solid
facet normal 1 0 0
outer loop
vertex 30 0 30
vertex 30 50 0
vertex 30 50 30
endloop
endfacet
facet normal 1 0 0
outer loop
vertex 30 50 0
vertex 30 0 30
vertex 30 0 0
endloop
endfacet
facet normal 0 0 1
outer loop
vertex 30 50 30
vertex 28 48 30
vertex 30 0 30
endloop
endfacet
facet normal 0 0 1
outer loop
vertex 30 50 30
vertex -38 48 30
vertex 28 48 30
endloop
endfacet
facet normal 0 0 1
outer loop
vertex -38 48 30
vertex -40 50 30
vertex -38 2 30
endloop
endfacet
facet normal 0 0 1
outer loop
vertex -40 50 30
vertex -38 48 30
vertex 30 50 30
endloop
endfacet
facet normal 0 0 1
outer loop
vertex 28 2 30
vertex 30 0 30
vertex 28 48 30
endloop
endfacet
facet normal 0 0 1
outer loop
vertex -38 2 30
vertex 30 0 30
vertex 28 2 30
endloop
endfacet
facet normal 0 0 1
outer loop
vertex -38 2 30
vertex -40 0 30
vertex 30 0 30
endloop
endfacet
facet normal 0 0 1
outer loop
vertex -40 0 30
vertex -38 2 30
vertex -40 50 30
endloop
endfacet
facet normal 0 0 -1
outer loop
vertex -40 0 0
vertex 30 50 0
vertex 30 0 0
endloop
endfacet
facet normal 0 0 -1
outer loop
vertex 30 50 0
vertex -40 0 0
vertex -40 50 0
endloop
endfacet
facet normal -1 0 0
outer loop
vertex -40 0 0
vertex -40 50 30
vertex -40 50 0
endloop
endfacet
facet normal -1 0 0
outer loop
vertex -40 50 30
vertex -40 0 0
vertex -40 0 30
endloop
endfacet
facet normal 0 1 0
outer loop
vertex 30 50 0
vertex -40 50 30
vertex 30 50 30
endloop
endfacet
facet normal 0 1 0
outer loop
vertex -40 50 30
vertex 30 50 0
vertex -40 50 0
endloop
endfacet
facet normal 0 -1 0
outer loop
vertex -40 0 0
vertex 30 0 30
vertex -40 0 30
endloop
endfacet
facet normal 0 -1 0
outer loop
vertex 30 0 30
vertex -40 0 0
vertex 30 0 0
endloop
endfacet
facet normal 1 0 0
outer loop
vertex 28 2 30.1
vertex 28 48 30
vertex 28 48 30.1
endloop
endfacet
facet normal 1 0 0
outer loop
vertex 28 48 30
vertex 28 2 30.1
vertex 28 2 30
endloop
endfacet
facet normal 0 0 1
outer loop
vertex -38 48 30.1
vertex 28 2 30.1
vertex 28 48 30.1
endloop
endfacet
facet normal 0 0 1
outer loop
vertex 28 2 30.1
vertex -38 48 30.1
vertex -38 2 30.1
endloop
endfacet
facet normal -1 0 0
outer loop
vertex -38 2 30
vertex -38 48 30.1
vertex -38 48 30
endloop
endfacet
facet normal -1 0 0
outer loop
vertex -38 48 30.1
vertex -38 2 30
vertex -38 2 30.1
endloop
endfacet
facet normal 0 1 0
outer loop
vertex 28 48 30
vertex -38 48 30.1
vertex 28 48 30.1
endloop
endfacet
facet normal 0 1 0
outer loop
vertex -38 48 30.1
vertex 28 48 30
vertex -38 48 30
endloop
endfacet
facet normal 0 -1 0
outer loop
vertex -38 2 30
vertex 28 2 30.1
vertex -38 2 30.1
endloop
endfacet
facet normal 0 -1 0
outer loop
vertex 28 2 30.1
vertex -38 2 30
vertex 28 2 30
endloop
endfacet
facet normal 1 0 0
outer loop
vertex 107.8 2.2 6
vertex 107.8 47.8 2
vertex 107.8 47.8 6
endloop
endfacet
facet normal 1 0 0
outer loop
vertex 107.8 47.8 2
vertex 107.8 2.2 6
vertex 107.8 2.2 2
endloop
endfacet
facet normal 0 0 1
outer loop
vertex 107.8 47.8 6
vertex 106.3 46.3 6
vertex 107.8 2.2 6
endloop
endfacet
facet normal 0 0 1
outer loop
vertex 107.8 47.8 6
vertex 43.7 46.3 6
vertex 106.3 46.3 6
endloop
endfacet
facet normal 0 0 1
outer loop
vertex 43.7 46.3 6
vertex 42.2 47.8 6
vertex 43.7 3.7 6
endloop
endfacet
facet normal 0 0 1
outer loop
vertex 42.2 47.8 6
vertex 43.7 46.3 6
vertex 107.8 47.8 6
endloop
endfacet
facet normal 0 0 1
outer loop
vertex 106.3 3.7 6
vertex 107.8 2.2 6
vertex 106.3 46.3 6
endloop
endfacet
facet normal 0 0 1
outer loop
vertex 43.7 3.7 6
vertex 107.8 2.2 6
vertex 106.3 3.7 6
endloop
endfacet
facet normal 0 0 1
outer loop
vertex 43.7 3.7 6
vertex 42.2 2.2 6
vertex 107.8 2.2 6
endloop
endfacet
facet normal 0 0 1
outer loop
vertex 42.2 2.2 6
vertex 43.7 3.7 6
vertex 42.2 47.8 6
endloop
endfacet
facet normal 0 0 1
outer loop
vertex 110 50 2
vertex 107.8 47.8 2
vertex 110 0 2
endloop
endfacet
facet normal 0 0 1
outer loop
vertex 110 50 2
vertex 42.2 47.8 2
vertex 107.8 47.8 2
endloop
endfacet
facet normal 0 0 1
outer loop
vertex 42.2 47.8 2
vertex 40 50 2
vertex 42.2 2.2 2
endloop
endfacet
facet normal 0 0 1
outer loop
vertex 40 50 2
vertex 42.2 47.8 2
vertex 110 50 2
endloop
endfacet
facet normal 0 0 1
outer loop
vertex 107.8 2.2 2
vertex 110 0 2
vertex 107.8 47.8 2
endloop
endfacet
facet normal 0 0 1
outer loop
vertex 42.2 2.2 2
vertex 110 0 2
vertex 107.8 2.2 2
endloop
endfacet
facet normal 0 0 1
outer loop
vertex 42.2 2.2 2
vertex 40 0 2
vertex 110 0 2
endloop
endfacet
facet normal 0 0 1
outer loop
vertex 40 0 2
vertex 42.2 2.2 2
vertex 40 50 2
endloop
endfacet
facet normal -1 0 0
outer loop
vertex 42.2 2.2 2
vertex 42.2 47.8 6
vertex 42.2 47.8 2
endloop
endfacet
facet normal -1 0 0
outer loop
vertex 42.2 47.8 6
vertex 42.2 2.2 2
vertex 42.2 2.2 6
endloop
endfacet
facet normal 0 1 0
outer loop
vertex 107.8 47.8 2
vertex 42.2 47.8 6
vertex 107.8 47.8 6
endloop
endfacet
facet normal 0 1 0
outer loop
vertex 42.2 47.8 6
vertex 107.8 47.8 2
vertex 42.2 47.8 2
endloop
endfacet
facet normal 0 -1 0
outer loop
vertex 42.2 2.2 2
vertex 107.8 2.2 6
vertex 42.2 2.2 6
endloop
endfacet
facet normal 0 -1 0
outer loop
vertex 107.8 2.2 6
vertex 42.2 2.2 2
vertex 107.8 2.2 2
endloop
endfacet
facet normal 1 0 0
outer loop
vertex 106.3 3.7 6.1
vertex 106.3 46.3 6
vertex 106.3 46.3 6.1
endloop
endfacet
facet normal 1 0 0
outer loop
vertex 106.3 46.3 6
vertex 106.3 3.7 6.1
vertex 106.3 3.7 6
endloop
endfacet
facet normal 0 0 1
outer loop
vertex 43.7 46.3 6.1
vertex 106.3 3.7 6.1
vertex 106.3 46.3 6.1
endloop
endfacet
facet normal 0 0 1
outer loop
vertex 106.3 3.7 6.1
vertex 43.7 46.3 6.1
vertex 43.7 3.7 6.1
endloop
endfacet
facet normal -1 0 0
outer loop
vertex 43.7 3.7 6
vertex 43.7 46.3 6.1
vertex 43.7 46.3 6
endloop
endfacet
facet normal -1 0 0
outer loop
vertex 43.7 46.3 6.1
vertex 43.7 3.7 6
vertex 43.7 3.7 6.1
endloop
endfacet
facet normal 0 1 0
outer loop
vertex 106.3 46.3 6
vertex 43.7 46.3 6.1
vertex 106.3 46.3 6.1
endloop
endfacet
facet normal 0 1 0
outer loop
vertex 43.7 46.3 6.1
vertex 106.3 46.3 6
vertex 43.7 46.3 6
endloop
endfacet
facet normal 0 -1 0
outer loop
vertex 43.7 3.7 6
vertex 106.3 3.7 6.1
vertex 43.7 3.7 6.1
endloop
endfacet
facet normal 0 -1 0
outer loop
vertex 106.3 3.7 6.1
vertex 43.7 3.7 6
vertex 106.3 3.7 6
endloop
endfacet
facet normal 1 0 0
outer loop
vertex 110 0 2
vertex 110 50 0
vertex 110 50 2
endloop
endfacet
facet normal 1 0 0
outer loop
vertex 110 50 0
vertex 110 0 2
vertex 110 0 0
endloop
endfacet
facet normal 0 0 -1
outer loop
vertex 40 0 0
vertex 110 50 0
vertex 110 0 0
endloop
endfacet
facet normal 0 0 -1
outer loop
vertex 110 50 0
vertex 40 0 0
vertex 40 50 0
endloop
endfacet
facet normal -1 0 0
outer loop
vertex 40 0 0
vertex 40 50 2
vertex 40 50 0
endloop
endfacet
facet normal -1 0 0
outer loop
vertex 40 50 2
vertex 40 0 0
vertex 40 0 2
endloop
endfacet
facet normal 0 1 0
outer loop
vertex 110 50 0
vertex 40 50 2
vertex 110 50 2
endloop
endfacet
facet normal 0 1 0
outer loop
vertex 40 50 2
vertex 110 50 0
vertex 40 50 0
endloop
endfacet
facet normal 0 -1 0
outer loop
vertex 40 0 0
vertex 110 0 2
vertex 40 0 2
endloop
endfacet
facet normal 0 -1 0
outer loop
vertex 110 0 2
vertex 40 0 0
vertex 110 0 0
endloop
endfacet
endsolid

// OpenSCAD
// Dimensions for the box (Part 1)
box_outer_x = 70;
box_outer_y = 50;
box_outer_z = 30;
box_wall_thickness = 2;
box_floor_thickness = 2;

// Dimensions for the lid (Part 2)
lid_plate_x = 70;
lid_plate_y = 50;
lid_plate_z = 2;
lip_thickness = 1.5;
lip_height = 4;
lip_outer_x = 65.6;
lip_outer_y = 45.6;

// Layout parameters
gap = 10;
$fn = 64;

// --- Part 1: The Box ---
// Positioned on the left side (negative X)
// Center of the box is at x = -(box_outer_x/2 + gap/2)
box_center_x = -(box_outer_x/2 + gap/2);

translate([box_center_x, 0, 0]) {
    // Outer shell
    cube([box_outer_x, box_outer_y, box_outer_z], center = false);
    
    // Inner cavity
    // The cavity is defined by subtracting the wall thickness from the outer dimensions
    // X: box_outer_x - 2*wall_thickness
    // Y: box_outer_y - 2*wall_thickness
    // Z: box_outer_z - floor_thickness (open top)
    cavity_x = box_outer_x - 2 * box_wall_thickness;
    cavity_y = box_outer_y - 2 * box_wall_thickness;
    cavity_z = box_outer_z - box_floor_thickness;
    
    // Position the cavity so it aligns with the inner walls
    // X offset: wall_thickness
    // Y offset: wall_thickness
    // Z offset: floor_thickness
    translate([box_wall_thickness, box_wall_thickness, box_floor_thickness]) {
        // Extend slightly past the top to ensure clean cut
        cube([cavity_x, cavity_y, cavity_z + 0.1], center = false);
    }
}

// --- Part 2: The Lid ---
// Positioned on the right side (positive X)
// Center of the lid is at x = +(box_outer_x/2 + gap/2)
lid_center_x = (box_outer_x/2 + gap/2);

translate([lid_center_x, 0, 0]) {
    // The lid is printed upside down, so the plate is at z=0 and the lip builds upward (+Z)
    
    // Base plate
    cube([lid_plate_x, lid_plate_y, lid_plate_z], center = false);
    
    // Lip
    // The lip is centered on the plate
    // Outer size: lip_outer_x x lip_outer_y
    // Height: lip_height
    // Thickness: lip_thickness
    
    // Calculate inner dimensions of the lip
    lip_inner_x = lip_outer_x - 2 * lip_thickness;
    lip_inner_y = lip_outer_y - 2 * lip_thickness;
    
    // Position the lip on top of the plate
    translate([0, 0, lid_plate_z]) {
        // Outer block of the lip
        // Center the lip on the plate
        lip_offset_x = (lid_plate_x - lip_outer_x) / 2;
        lip_offset_y = (lid_plate_y - lip_outer_y) / 2;
        
        translate([lip_offset_x, lip_offset_y, 0]) {
            cube([lip_outer_x, lip_outer_y, lip_height], center = false);
            
            // Cut out the inner part of the lip to make it a wall
            // Extend slightly past the top and bottom to ensure clean cut
            translate([lip_thickness, lip_thickness, -0.1]) {
                cube([lip_inner_x, lip_inner_y, lip_height + 0.2], center = false);
            }
        }
    }
}
